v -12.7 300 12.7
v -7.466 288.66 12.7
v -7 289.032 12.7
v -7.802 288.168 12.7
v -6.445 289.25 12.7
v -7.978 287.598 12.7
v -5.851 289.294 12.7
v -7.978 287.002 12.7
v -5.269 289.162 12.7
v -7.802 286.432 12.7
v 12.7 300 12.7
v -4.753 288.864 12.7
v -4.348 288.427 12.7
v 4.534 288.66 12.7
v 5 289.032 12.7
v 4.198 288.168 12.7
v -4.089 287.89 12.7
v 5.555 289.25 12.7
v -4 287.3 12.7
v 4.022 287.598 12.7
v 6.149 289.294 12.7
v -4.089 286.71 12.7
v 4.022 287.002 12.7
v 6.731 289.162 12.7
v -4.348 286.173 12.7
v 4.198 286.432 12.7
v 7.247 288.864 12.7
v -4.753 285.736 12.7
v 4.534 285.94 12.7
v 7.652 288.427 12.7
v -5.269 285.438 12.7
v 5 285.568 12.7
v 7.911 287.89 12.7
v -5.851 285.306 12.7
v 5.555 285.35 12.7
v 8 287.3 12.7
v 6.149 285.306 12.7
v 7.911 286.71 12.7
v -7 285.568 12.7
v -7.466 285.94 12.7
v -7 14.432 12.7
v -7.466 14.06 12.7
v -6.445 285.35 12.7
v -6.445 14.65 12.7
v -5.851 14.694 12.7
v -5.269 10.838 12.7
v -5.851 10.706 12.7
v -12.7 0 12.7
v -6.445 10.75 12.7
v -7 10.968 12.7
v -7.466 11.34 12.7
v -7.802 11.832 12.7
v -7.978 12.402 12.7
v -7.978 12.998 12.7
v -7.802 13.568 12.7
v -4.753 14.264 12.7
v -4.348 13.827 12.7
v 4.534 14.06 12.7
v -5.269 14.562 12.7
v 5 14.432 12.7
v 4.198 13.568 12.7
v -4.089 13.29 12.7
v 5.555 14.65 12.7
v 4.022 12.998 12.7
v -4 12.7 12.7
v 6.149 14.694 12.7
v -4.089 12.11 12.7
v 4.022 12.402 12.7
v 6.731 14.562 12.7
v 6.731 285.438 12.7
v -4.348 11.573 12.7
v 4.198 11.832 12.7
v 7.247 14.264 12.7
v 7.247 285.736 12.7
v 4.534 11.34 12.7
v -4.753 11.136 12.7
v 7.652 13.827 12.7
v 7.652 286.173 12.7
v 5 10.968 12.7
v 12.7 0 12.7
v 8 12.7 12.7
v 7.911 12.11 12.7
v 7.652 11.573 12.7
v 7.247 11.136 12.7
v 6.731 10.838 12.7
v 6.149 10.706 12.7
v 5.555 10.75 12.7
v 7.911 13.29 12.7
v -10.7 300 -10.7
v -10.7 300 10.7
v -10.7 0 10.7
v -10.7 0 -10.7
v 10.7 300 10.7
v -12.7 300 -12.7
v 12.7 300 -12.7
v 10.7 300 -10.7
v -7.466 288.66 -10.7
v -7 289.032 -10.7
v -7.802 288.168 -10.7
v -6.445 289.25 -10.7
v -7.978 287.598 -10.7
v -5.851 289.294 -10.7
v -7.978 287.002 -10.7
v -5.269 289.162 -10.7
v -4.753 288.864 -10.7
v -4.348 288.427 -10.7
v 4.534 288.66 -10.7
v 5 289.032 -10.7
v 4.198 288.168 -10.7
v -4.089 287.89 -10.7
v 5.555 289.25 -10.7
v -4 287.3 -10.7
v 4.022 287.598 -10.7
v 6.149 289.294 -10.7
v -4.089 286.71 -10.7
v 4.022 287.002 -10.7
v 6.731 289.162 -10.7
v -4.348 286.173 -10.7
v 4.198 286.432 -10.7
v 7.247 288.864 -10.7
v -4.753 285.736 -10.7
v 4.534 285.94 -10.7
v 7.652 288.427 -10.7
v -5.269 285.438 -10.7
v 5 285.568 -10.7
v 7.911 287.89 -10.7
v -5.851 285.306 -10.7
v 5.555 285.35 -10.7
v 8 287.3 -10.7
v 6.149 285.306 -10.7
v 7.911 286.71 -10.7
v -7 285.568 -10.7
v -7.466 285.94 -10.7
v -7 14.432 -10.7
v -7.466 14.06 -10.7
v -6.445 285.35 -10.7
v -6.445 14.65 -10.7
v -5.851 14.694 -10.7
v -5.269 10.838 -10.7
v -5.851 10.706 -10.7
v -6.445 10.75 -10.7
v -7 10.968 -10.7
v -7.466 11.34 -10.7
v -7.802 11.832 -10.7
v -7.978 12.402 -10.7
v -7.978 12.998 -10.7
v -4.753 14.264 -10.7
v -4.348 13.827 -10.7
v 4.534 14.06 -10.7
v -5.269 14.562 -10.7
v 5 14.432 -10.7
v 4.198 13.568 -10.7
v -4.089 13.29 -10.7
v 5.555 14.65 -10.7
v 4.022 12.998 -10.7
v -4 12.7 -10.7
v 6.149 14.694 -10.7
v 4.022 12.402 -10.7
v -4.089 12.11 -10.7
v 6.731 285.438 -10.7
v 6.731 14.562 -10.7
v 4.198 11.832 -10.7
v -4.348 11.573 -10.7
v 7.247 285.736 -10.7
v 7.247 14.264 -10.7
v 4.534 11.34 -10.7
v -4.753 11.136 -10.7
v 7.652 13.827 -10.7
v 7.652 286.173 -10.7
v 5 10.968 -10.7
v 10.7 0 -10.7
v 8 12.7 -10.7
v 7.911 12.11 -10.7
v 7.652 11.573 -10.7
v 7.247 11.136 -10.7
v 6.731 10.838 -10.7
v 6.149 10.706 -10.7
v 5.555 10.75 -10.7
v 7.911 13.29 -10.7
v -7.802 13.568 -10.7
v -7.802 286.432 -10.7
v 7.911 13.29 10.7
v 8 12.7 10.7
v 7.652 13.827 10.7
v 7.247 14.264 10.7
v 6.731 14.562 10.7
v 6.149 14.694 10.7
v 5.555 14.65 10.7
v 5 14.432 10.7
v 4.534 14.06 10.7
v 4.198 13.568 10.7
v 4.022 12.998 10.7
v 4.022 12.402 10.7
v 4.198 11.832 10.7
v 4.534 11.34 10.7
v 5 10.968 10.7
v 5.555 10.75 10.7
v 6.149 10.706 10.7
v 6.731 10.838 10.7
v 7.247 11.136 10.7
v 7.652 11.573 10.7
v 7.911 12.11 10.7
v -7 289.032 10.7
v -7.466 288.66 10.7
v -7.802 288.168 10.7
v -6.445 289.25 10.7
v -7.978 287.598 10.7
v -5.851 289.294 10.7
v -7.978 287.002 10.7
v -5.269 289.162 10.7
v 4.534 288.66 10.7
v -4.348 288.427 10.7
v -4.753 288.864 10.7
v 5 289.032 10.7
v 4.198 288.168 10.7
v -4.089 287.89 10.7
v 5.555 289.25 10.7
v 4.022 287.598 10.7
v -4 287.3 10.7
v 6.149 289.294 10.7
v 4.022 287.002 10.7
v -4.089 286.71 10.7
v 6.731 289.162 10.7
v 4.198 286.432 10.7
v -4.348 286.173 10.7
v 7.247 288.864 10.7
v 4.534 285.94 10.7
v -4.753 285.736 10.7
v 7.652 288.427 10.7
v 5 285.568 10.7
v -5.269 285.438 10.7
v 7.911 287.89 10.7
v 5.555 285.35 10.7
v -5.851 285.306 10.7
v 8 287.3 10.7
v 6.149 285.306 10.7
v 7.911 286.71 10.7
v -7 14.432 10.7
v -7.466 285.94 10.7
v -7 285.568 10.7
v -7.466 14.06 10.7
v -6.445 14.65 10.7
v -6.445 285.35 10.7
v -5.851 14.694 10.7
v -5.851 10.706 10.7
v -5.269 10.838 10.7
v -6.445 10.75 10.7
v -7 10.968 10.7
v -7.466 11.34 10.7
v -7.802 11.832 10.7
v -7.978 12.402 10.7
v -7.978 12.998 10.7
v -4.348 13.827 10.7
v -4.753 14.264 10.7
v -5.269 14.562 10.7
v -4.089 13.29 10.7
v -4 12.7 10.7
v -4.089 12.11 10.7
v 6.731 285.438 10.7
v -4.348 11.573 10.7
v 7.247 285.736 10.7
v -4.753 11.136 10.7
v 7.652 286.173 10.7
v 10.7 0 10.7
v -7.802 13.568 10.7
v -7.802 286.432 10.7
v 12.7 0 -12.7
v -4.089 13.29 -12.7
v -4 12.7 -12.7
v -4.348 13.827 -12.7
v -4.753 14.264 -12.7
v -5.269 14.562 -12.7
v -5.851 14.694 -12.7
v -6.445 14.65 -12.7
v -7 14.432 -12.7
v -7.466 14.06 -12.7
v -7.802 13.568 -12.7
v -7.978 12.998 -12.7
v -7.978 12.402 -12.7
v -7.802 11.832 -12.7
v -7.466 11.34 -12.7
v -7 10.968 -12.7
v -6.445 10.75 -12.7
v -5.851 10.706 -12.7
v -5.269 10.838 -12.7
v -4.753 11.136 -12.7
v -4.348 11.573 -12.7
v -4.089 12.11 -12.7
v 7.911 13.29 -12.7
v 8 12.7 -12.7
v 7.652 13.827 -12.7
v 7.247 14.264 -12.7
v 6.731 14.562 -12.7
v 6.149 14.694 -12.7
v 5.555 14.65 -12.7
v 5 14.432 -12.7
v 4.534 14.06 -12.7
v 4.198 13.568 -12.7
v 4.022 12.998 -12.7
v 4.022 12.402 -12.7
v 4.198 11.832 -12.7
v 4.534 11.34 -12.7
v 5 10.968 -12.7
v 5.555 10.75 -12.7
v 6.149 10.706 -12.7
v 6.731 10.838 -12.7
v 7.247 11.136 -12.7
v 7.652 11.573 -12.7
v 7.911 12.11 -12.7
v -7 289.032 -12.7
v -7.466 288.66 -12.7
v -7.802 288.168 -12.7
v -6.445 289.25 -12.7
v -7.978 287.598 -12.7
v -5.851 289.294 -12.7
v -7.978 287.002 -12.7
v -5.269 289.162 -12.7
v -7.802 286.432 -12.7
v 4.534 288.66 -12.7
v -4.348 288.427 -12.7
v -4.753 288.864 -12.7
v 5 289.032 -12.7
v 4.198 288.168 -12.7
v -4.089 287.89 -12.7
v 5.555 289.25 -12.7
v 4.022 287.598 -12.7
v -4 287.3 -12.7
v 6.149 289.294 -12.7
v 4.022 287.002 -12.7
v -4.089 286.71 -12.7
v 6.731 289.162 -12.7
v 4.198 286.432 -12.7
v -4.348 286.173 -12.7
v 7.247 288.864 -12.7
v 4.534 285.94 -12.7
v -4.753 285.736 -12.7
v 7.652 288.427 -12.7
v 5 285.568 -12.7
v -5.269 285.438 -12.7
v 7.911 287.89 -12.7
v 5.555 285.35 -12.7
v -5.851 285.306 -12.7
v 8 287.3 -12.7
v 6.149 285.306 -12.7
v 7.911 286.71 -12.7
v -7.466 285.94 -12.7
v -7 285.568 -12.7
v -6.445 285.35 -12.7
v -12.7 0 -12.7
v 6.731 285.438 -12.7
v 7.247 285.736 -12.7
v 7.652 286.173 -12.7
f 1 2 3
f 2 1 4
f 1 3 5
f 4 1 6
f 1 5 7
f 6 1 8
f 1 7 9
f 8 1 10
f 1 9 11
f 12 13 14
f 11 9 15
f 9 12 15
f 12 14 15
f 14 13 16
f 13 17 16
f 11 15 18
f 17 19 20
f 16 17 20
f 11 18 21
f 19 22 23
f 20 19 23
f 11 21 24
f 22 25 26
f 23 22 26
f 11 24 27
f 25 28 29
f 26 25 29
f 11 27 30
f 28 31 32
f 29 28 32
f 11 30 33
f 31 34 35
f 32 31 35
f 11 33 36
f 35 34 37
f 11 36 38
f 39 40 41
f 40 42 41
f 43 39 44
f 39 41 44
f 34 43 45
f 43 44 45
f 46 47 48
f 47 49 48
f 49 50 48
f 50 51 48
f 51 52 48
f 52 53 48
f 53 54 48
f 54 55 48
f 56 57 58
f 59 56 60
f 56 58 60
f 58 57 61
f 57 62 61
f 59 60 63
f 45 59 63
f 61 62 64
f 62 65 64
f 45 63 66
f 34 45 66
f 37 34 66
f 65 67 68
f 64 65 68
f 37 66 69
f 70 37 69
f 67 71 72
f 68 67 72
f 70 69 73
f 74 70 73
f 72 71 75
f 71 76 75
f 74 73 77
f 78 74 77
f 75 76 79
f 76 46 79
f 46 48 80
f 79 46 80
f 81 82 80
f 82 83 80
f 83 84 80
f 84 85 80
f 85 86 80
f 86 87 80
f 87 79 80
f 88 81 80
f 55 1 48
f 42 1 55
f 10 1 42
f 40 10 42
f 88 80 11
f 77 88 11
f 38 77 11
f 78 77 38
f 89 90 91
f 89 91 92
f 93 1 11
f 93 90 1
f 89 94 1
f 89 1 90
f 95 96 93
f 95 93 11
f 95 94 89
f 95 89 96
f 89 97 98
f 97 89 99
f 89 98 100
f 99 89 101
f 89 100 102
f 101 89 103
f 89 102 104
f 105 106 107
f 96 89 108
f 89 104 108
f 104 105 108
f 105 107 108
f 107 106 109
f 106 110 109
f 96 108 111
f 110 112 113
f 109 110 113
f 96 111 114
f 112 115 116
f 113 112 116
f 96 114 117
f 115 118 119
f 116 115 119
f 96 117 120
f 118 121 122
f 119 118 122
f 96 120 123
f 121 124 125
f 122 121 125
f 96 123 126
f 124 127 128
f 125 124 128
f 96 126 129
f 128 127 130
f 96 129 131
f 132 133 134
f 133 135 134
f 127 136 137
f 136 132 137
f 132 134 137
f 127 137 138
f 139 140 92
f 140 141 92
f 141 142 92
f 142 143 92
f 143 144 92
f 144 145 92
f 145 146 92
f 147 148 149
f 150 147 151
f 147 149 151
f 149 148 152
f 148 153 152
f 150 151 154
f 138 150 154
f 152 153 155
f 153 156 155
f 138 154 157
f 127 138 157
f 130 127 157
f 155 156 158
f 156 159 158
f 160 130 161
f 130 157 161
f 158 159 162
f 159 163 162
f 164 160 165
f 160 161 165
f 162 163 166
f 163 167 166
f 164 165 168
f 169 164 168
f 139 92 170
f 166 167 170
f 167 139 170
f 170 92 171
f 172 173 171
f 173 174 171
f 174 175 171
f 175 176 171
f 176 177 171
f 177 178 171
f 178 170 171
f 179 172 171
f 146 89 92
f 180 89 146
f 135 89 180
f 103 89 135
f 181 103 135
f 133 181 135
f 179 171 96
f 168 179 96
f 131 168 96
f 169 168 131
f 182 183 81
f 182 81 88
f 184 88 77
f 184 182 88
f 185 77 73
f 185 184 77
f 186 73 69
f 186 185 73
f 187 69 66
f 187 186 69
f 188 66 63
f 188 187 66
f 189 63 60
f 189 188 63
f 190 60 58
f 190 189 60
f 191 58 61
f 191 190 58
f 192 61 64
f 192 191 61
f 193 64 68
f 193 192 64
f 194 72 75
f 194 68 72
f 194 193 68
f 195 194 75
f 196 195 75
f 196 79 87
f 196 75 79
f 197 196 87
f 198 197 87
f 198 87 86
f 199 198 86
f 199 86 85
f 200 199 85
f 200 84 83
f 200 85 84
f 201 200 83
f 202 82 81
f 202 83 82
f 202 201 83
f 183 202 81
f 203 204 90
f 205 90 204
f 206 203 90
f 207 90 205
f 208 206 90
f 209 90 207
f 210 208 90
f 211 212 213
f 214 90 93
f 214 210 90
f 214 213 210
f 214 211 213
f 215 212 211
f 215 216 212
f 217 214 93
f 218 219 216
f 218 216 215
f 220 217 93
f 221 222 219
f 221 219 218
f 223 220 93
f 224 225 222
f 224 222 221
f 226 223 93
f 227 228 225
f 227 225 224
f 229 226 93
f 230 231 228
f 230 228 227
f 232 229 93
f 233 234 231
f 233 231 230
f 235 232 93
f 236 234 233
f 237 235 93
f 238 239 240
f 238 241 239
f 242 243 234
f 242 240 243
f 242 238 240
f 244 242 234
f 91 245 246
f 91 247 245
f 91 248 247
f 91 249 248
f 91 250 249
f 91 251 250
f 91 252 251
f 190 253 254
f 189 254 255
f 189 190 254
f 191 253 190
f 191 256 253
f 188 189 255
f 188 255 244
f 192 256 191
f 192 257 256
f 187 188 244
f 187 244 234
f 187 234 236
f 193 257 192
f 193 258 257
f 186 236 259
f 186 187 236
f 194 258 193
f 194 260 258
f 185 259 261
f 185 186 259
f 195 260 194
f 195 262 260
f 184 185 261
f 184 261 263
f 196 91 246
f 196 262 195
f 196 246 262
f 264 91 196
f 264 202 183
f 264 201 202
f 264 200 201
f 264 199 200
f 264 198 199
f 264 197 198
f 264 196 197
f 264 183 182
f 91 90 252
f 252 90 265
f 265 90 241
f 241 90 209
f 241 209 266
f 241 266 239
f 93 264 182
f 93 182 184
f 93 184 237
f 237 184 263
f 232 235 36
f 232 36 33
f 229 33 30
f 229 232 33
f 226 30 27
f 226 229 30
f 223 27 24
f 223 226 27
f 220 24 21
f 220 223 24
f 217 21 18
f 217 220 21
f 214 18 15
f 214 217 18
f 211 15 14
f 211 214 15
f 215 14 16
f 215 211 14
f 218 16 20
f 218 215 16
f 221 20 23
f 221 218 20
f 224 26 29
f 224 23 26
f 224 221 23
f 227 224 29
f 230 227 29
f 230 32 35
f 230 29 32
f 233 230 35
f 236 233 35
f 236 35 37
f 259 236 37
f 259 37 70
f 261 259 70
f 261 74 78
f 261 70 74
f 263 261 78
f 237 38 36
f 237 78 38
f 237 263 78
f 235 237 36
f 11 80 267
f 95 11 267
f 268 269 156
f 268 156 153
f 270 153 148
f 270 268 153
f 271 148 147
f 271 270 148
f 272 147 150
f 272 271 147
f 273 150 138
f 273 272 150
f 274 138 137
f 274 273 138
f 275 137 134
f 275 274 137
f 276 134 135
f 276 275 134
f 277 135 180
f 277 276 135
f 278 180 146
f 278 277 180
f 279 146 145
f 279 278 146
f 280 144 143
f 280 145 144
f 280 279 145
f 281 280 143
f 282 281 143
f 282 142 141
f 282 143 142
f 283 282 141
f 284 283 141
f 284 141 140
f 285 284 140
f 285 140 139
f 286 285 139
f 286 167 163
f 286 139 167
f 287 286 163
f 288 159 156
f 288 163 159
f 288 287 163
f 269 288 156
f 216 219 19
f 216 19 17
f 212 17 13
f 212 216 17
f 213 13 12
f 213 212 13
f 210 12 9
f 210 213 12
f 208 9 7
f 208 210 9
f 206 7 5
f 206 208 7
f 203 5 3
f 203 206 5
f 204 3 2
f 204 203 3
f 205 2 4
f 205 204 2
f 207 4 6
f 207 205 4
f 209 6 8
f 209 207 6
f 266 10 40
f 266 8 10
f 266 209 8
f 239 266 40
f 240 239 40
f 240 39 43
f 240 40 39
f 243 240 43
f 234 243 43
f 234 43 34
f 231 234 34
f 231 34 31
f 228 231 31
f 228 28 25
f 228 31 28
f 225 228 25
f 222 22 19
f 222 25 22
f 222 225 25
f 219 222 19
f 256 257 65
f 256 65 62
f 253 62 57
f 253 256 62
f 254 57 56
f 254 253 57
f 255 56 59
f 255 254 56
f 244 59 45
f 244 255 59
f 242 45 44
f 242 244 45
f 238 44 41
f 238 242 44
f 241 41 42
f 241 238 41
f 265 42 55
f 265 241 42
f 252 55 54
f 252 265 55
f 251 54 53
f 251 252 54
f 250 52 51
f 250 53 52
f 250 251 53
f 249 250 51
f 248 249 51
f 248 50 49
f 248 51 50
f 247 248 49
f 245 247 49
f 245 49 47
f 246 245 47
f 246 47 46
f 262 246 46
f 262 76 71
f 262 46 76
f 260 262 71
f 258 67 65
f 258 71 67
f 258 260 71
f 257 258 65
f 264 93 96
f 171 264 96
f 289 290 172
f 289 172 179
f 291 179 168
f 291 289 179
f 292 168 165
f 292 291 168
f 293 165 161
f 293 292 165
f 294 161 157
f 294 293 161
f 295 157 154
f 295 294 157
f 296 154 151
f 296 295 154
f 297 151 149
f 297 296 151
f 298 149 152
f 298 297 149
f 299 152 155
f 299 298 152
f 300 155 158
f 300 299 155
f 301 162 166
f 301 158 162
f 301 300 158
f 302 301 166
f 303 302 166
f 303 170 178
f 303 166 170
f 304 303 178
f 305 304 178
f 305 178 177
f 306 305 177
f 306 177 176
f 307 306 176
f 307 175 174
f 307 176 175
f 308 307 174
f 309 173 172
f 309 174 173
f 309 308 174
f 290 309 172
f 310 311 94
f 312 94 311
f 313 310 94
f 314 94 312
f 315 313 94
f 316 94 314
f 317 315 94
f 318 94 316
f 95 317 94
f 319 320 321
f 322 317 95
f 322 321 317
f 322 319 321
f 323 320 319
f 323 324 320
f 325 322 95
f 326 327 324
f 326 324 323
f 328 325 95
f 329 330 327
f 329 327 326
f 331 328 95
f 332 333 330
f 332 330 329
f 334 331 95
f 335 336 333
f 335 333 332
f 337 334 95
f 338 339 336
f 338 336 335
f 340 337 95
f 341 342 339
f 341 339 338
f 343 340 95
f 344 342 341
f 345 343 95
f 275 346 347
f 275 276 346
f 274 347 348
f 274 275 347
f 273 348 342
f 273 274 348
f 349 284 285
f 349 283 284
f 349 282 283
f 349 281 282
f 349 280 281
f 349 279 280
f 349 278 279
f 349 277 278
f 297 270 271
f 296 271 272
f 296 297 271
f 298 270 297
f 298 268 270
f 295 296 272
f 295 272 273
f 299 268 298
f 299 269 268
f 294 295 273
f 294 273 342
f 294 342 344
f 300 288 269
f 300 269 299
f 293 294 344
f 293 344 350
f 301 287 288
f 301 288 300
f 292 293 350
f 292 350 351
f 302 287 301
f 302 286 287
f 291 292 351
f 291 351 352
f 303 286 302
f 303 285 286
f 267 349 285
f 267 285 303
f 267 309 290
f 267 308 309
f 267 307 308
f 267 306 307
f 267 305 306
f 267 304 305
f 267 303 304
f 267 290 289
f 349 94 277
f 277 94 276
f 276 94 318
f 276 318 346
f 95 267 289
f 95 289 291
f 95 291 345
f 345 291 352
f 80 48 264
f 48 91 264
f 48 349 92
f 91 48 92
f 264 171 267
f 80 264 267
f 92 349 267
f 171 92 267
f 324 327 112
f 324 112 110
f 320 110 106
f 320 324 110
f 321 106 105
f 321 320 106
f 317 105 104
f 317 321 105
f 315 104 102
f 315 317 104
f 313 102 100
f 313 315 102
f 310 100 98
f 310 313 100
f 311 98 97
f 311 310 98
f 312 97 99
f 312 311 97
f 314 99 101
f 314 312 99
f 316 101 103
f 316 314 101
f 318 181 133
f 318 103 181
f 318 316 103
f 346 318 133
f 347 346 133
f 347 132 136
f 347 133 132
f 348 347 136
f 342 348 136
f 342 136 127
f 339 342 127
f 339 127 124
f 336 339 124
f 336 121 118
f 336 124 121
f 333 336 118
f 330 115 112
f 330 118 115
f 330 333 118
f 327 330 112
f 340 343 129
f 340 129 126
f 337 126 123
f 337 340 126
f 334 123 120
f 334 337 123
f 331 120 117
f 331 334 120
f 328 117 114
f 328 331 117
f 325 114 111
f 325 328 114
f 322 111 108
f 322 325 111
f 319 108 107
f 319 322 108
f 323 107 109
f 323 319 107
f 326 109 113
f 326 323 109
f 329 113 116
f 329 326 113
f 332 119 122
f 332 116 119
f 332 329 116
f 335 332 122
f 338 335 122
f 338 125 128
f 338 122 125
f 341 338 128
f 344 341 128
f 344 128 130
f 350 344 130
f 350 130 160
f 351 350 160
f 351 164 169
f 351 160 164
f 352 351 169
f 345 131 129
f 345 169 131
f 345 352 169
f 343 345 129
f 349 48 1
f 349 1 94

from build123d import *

# Parameters (mm, degrees)
SKETCH1_W               = 25.4
SKETCH1_H               = 25.4
SKETCH1_W_2             = 21.4
SKETCH1_H_2             = 21.4
BOSS_EXTRUDE1_DEPTH     = 300
CUT_EXTRUDE1_DEPTH      = 302.341085815
CUT_EXTRUDE1_DEPTH_BACK = 302.341085815
SKETCH2_R               = 2


with BuildPart() as part:
    # Sketch1 → Boss-Extrude1 (new body)
    with BuildSketch(Plane(origin=(0, 0, 0), x_dir=(1, 0, 0), z_dir=(0, 1, 0))):
        Rectangle(SKETCH1_W, SKETCH1_H)
        Rectangle(SKETCH1_W_2, SKETCH1_H_2, mode=Mode.SUBTRACT)
    extrude(amount=BOSS_EXTRUDE1_DEPTH)

    # Sketch2 → Cut-Extrude1 (cut, two sides: drawn at the far end of the back side and taken through both)
    with BuildSketch(Plane.XY.offset(12.7).offset(-CUT_EXTRUDE1_DEPTH_BACK)):
        with Locations((-6, 12.7)):
            Circle(SKETCH2_R)
        with Locations((6, 12.7)):
            Circle(SKETCH2_R)
        with Locations((6, 287.3)):
            Circle(SKETCH2_R)
        with Locations((-6, 287.3)):
            Circle(SKETCH2_R)
    extrude(amount=CUT_EXTRUDE1_DEPTH + CUT_EXTRUDE1_DEPTH_BACK, mode=Mode.SUBTRACT)


solid = part.part
